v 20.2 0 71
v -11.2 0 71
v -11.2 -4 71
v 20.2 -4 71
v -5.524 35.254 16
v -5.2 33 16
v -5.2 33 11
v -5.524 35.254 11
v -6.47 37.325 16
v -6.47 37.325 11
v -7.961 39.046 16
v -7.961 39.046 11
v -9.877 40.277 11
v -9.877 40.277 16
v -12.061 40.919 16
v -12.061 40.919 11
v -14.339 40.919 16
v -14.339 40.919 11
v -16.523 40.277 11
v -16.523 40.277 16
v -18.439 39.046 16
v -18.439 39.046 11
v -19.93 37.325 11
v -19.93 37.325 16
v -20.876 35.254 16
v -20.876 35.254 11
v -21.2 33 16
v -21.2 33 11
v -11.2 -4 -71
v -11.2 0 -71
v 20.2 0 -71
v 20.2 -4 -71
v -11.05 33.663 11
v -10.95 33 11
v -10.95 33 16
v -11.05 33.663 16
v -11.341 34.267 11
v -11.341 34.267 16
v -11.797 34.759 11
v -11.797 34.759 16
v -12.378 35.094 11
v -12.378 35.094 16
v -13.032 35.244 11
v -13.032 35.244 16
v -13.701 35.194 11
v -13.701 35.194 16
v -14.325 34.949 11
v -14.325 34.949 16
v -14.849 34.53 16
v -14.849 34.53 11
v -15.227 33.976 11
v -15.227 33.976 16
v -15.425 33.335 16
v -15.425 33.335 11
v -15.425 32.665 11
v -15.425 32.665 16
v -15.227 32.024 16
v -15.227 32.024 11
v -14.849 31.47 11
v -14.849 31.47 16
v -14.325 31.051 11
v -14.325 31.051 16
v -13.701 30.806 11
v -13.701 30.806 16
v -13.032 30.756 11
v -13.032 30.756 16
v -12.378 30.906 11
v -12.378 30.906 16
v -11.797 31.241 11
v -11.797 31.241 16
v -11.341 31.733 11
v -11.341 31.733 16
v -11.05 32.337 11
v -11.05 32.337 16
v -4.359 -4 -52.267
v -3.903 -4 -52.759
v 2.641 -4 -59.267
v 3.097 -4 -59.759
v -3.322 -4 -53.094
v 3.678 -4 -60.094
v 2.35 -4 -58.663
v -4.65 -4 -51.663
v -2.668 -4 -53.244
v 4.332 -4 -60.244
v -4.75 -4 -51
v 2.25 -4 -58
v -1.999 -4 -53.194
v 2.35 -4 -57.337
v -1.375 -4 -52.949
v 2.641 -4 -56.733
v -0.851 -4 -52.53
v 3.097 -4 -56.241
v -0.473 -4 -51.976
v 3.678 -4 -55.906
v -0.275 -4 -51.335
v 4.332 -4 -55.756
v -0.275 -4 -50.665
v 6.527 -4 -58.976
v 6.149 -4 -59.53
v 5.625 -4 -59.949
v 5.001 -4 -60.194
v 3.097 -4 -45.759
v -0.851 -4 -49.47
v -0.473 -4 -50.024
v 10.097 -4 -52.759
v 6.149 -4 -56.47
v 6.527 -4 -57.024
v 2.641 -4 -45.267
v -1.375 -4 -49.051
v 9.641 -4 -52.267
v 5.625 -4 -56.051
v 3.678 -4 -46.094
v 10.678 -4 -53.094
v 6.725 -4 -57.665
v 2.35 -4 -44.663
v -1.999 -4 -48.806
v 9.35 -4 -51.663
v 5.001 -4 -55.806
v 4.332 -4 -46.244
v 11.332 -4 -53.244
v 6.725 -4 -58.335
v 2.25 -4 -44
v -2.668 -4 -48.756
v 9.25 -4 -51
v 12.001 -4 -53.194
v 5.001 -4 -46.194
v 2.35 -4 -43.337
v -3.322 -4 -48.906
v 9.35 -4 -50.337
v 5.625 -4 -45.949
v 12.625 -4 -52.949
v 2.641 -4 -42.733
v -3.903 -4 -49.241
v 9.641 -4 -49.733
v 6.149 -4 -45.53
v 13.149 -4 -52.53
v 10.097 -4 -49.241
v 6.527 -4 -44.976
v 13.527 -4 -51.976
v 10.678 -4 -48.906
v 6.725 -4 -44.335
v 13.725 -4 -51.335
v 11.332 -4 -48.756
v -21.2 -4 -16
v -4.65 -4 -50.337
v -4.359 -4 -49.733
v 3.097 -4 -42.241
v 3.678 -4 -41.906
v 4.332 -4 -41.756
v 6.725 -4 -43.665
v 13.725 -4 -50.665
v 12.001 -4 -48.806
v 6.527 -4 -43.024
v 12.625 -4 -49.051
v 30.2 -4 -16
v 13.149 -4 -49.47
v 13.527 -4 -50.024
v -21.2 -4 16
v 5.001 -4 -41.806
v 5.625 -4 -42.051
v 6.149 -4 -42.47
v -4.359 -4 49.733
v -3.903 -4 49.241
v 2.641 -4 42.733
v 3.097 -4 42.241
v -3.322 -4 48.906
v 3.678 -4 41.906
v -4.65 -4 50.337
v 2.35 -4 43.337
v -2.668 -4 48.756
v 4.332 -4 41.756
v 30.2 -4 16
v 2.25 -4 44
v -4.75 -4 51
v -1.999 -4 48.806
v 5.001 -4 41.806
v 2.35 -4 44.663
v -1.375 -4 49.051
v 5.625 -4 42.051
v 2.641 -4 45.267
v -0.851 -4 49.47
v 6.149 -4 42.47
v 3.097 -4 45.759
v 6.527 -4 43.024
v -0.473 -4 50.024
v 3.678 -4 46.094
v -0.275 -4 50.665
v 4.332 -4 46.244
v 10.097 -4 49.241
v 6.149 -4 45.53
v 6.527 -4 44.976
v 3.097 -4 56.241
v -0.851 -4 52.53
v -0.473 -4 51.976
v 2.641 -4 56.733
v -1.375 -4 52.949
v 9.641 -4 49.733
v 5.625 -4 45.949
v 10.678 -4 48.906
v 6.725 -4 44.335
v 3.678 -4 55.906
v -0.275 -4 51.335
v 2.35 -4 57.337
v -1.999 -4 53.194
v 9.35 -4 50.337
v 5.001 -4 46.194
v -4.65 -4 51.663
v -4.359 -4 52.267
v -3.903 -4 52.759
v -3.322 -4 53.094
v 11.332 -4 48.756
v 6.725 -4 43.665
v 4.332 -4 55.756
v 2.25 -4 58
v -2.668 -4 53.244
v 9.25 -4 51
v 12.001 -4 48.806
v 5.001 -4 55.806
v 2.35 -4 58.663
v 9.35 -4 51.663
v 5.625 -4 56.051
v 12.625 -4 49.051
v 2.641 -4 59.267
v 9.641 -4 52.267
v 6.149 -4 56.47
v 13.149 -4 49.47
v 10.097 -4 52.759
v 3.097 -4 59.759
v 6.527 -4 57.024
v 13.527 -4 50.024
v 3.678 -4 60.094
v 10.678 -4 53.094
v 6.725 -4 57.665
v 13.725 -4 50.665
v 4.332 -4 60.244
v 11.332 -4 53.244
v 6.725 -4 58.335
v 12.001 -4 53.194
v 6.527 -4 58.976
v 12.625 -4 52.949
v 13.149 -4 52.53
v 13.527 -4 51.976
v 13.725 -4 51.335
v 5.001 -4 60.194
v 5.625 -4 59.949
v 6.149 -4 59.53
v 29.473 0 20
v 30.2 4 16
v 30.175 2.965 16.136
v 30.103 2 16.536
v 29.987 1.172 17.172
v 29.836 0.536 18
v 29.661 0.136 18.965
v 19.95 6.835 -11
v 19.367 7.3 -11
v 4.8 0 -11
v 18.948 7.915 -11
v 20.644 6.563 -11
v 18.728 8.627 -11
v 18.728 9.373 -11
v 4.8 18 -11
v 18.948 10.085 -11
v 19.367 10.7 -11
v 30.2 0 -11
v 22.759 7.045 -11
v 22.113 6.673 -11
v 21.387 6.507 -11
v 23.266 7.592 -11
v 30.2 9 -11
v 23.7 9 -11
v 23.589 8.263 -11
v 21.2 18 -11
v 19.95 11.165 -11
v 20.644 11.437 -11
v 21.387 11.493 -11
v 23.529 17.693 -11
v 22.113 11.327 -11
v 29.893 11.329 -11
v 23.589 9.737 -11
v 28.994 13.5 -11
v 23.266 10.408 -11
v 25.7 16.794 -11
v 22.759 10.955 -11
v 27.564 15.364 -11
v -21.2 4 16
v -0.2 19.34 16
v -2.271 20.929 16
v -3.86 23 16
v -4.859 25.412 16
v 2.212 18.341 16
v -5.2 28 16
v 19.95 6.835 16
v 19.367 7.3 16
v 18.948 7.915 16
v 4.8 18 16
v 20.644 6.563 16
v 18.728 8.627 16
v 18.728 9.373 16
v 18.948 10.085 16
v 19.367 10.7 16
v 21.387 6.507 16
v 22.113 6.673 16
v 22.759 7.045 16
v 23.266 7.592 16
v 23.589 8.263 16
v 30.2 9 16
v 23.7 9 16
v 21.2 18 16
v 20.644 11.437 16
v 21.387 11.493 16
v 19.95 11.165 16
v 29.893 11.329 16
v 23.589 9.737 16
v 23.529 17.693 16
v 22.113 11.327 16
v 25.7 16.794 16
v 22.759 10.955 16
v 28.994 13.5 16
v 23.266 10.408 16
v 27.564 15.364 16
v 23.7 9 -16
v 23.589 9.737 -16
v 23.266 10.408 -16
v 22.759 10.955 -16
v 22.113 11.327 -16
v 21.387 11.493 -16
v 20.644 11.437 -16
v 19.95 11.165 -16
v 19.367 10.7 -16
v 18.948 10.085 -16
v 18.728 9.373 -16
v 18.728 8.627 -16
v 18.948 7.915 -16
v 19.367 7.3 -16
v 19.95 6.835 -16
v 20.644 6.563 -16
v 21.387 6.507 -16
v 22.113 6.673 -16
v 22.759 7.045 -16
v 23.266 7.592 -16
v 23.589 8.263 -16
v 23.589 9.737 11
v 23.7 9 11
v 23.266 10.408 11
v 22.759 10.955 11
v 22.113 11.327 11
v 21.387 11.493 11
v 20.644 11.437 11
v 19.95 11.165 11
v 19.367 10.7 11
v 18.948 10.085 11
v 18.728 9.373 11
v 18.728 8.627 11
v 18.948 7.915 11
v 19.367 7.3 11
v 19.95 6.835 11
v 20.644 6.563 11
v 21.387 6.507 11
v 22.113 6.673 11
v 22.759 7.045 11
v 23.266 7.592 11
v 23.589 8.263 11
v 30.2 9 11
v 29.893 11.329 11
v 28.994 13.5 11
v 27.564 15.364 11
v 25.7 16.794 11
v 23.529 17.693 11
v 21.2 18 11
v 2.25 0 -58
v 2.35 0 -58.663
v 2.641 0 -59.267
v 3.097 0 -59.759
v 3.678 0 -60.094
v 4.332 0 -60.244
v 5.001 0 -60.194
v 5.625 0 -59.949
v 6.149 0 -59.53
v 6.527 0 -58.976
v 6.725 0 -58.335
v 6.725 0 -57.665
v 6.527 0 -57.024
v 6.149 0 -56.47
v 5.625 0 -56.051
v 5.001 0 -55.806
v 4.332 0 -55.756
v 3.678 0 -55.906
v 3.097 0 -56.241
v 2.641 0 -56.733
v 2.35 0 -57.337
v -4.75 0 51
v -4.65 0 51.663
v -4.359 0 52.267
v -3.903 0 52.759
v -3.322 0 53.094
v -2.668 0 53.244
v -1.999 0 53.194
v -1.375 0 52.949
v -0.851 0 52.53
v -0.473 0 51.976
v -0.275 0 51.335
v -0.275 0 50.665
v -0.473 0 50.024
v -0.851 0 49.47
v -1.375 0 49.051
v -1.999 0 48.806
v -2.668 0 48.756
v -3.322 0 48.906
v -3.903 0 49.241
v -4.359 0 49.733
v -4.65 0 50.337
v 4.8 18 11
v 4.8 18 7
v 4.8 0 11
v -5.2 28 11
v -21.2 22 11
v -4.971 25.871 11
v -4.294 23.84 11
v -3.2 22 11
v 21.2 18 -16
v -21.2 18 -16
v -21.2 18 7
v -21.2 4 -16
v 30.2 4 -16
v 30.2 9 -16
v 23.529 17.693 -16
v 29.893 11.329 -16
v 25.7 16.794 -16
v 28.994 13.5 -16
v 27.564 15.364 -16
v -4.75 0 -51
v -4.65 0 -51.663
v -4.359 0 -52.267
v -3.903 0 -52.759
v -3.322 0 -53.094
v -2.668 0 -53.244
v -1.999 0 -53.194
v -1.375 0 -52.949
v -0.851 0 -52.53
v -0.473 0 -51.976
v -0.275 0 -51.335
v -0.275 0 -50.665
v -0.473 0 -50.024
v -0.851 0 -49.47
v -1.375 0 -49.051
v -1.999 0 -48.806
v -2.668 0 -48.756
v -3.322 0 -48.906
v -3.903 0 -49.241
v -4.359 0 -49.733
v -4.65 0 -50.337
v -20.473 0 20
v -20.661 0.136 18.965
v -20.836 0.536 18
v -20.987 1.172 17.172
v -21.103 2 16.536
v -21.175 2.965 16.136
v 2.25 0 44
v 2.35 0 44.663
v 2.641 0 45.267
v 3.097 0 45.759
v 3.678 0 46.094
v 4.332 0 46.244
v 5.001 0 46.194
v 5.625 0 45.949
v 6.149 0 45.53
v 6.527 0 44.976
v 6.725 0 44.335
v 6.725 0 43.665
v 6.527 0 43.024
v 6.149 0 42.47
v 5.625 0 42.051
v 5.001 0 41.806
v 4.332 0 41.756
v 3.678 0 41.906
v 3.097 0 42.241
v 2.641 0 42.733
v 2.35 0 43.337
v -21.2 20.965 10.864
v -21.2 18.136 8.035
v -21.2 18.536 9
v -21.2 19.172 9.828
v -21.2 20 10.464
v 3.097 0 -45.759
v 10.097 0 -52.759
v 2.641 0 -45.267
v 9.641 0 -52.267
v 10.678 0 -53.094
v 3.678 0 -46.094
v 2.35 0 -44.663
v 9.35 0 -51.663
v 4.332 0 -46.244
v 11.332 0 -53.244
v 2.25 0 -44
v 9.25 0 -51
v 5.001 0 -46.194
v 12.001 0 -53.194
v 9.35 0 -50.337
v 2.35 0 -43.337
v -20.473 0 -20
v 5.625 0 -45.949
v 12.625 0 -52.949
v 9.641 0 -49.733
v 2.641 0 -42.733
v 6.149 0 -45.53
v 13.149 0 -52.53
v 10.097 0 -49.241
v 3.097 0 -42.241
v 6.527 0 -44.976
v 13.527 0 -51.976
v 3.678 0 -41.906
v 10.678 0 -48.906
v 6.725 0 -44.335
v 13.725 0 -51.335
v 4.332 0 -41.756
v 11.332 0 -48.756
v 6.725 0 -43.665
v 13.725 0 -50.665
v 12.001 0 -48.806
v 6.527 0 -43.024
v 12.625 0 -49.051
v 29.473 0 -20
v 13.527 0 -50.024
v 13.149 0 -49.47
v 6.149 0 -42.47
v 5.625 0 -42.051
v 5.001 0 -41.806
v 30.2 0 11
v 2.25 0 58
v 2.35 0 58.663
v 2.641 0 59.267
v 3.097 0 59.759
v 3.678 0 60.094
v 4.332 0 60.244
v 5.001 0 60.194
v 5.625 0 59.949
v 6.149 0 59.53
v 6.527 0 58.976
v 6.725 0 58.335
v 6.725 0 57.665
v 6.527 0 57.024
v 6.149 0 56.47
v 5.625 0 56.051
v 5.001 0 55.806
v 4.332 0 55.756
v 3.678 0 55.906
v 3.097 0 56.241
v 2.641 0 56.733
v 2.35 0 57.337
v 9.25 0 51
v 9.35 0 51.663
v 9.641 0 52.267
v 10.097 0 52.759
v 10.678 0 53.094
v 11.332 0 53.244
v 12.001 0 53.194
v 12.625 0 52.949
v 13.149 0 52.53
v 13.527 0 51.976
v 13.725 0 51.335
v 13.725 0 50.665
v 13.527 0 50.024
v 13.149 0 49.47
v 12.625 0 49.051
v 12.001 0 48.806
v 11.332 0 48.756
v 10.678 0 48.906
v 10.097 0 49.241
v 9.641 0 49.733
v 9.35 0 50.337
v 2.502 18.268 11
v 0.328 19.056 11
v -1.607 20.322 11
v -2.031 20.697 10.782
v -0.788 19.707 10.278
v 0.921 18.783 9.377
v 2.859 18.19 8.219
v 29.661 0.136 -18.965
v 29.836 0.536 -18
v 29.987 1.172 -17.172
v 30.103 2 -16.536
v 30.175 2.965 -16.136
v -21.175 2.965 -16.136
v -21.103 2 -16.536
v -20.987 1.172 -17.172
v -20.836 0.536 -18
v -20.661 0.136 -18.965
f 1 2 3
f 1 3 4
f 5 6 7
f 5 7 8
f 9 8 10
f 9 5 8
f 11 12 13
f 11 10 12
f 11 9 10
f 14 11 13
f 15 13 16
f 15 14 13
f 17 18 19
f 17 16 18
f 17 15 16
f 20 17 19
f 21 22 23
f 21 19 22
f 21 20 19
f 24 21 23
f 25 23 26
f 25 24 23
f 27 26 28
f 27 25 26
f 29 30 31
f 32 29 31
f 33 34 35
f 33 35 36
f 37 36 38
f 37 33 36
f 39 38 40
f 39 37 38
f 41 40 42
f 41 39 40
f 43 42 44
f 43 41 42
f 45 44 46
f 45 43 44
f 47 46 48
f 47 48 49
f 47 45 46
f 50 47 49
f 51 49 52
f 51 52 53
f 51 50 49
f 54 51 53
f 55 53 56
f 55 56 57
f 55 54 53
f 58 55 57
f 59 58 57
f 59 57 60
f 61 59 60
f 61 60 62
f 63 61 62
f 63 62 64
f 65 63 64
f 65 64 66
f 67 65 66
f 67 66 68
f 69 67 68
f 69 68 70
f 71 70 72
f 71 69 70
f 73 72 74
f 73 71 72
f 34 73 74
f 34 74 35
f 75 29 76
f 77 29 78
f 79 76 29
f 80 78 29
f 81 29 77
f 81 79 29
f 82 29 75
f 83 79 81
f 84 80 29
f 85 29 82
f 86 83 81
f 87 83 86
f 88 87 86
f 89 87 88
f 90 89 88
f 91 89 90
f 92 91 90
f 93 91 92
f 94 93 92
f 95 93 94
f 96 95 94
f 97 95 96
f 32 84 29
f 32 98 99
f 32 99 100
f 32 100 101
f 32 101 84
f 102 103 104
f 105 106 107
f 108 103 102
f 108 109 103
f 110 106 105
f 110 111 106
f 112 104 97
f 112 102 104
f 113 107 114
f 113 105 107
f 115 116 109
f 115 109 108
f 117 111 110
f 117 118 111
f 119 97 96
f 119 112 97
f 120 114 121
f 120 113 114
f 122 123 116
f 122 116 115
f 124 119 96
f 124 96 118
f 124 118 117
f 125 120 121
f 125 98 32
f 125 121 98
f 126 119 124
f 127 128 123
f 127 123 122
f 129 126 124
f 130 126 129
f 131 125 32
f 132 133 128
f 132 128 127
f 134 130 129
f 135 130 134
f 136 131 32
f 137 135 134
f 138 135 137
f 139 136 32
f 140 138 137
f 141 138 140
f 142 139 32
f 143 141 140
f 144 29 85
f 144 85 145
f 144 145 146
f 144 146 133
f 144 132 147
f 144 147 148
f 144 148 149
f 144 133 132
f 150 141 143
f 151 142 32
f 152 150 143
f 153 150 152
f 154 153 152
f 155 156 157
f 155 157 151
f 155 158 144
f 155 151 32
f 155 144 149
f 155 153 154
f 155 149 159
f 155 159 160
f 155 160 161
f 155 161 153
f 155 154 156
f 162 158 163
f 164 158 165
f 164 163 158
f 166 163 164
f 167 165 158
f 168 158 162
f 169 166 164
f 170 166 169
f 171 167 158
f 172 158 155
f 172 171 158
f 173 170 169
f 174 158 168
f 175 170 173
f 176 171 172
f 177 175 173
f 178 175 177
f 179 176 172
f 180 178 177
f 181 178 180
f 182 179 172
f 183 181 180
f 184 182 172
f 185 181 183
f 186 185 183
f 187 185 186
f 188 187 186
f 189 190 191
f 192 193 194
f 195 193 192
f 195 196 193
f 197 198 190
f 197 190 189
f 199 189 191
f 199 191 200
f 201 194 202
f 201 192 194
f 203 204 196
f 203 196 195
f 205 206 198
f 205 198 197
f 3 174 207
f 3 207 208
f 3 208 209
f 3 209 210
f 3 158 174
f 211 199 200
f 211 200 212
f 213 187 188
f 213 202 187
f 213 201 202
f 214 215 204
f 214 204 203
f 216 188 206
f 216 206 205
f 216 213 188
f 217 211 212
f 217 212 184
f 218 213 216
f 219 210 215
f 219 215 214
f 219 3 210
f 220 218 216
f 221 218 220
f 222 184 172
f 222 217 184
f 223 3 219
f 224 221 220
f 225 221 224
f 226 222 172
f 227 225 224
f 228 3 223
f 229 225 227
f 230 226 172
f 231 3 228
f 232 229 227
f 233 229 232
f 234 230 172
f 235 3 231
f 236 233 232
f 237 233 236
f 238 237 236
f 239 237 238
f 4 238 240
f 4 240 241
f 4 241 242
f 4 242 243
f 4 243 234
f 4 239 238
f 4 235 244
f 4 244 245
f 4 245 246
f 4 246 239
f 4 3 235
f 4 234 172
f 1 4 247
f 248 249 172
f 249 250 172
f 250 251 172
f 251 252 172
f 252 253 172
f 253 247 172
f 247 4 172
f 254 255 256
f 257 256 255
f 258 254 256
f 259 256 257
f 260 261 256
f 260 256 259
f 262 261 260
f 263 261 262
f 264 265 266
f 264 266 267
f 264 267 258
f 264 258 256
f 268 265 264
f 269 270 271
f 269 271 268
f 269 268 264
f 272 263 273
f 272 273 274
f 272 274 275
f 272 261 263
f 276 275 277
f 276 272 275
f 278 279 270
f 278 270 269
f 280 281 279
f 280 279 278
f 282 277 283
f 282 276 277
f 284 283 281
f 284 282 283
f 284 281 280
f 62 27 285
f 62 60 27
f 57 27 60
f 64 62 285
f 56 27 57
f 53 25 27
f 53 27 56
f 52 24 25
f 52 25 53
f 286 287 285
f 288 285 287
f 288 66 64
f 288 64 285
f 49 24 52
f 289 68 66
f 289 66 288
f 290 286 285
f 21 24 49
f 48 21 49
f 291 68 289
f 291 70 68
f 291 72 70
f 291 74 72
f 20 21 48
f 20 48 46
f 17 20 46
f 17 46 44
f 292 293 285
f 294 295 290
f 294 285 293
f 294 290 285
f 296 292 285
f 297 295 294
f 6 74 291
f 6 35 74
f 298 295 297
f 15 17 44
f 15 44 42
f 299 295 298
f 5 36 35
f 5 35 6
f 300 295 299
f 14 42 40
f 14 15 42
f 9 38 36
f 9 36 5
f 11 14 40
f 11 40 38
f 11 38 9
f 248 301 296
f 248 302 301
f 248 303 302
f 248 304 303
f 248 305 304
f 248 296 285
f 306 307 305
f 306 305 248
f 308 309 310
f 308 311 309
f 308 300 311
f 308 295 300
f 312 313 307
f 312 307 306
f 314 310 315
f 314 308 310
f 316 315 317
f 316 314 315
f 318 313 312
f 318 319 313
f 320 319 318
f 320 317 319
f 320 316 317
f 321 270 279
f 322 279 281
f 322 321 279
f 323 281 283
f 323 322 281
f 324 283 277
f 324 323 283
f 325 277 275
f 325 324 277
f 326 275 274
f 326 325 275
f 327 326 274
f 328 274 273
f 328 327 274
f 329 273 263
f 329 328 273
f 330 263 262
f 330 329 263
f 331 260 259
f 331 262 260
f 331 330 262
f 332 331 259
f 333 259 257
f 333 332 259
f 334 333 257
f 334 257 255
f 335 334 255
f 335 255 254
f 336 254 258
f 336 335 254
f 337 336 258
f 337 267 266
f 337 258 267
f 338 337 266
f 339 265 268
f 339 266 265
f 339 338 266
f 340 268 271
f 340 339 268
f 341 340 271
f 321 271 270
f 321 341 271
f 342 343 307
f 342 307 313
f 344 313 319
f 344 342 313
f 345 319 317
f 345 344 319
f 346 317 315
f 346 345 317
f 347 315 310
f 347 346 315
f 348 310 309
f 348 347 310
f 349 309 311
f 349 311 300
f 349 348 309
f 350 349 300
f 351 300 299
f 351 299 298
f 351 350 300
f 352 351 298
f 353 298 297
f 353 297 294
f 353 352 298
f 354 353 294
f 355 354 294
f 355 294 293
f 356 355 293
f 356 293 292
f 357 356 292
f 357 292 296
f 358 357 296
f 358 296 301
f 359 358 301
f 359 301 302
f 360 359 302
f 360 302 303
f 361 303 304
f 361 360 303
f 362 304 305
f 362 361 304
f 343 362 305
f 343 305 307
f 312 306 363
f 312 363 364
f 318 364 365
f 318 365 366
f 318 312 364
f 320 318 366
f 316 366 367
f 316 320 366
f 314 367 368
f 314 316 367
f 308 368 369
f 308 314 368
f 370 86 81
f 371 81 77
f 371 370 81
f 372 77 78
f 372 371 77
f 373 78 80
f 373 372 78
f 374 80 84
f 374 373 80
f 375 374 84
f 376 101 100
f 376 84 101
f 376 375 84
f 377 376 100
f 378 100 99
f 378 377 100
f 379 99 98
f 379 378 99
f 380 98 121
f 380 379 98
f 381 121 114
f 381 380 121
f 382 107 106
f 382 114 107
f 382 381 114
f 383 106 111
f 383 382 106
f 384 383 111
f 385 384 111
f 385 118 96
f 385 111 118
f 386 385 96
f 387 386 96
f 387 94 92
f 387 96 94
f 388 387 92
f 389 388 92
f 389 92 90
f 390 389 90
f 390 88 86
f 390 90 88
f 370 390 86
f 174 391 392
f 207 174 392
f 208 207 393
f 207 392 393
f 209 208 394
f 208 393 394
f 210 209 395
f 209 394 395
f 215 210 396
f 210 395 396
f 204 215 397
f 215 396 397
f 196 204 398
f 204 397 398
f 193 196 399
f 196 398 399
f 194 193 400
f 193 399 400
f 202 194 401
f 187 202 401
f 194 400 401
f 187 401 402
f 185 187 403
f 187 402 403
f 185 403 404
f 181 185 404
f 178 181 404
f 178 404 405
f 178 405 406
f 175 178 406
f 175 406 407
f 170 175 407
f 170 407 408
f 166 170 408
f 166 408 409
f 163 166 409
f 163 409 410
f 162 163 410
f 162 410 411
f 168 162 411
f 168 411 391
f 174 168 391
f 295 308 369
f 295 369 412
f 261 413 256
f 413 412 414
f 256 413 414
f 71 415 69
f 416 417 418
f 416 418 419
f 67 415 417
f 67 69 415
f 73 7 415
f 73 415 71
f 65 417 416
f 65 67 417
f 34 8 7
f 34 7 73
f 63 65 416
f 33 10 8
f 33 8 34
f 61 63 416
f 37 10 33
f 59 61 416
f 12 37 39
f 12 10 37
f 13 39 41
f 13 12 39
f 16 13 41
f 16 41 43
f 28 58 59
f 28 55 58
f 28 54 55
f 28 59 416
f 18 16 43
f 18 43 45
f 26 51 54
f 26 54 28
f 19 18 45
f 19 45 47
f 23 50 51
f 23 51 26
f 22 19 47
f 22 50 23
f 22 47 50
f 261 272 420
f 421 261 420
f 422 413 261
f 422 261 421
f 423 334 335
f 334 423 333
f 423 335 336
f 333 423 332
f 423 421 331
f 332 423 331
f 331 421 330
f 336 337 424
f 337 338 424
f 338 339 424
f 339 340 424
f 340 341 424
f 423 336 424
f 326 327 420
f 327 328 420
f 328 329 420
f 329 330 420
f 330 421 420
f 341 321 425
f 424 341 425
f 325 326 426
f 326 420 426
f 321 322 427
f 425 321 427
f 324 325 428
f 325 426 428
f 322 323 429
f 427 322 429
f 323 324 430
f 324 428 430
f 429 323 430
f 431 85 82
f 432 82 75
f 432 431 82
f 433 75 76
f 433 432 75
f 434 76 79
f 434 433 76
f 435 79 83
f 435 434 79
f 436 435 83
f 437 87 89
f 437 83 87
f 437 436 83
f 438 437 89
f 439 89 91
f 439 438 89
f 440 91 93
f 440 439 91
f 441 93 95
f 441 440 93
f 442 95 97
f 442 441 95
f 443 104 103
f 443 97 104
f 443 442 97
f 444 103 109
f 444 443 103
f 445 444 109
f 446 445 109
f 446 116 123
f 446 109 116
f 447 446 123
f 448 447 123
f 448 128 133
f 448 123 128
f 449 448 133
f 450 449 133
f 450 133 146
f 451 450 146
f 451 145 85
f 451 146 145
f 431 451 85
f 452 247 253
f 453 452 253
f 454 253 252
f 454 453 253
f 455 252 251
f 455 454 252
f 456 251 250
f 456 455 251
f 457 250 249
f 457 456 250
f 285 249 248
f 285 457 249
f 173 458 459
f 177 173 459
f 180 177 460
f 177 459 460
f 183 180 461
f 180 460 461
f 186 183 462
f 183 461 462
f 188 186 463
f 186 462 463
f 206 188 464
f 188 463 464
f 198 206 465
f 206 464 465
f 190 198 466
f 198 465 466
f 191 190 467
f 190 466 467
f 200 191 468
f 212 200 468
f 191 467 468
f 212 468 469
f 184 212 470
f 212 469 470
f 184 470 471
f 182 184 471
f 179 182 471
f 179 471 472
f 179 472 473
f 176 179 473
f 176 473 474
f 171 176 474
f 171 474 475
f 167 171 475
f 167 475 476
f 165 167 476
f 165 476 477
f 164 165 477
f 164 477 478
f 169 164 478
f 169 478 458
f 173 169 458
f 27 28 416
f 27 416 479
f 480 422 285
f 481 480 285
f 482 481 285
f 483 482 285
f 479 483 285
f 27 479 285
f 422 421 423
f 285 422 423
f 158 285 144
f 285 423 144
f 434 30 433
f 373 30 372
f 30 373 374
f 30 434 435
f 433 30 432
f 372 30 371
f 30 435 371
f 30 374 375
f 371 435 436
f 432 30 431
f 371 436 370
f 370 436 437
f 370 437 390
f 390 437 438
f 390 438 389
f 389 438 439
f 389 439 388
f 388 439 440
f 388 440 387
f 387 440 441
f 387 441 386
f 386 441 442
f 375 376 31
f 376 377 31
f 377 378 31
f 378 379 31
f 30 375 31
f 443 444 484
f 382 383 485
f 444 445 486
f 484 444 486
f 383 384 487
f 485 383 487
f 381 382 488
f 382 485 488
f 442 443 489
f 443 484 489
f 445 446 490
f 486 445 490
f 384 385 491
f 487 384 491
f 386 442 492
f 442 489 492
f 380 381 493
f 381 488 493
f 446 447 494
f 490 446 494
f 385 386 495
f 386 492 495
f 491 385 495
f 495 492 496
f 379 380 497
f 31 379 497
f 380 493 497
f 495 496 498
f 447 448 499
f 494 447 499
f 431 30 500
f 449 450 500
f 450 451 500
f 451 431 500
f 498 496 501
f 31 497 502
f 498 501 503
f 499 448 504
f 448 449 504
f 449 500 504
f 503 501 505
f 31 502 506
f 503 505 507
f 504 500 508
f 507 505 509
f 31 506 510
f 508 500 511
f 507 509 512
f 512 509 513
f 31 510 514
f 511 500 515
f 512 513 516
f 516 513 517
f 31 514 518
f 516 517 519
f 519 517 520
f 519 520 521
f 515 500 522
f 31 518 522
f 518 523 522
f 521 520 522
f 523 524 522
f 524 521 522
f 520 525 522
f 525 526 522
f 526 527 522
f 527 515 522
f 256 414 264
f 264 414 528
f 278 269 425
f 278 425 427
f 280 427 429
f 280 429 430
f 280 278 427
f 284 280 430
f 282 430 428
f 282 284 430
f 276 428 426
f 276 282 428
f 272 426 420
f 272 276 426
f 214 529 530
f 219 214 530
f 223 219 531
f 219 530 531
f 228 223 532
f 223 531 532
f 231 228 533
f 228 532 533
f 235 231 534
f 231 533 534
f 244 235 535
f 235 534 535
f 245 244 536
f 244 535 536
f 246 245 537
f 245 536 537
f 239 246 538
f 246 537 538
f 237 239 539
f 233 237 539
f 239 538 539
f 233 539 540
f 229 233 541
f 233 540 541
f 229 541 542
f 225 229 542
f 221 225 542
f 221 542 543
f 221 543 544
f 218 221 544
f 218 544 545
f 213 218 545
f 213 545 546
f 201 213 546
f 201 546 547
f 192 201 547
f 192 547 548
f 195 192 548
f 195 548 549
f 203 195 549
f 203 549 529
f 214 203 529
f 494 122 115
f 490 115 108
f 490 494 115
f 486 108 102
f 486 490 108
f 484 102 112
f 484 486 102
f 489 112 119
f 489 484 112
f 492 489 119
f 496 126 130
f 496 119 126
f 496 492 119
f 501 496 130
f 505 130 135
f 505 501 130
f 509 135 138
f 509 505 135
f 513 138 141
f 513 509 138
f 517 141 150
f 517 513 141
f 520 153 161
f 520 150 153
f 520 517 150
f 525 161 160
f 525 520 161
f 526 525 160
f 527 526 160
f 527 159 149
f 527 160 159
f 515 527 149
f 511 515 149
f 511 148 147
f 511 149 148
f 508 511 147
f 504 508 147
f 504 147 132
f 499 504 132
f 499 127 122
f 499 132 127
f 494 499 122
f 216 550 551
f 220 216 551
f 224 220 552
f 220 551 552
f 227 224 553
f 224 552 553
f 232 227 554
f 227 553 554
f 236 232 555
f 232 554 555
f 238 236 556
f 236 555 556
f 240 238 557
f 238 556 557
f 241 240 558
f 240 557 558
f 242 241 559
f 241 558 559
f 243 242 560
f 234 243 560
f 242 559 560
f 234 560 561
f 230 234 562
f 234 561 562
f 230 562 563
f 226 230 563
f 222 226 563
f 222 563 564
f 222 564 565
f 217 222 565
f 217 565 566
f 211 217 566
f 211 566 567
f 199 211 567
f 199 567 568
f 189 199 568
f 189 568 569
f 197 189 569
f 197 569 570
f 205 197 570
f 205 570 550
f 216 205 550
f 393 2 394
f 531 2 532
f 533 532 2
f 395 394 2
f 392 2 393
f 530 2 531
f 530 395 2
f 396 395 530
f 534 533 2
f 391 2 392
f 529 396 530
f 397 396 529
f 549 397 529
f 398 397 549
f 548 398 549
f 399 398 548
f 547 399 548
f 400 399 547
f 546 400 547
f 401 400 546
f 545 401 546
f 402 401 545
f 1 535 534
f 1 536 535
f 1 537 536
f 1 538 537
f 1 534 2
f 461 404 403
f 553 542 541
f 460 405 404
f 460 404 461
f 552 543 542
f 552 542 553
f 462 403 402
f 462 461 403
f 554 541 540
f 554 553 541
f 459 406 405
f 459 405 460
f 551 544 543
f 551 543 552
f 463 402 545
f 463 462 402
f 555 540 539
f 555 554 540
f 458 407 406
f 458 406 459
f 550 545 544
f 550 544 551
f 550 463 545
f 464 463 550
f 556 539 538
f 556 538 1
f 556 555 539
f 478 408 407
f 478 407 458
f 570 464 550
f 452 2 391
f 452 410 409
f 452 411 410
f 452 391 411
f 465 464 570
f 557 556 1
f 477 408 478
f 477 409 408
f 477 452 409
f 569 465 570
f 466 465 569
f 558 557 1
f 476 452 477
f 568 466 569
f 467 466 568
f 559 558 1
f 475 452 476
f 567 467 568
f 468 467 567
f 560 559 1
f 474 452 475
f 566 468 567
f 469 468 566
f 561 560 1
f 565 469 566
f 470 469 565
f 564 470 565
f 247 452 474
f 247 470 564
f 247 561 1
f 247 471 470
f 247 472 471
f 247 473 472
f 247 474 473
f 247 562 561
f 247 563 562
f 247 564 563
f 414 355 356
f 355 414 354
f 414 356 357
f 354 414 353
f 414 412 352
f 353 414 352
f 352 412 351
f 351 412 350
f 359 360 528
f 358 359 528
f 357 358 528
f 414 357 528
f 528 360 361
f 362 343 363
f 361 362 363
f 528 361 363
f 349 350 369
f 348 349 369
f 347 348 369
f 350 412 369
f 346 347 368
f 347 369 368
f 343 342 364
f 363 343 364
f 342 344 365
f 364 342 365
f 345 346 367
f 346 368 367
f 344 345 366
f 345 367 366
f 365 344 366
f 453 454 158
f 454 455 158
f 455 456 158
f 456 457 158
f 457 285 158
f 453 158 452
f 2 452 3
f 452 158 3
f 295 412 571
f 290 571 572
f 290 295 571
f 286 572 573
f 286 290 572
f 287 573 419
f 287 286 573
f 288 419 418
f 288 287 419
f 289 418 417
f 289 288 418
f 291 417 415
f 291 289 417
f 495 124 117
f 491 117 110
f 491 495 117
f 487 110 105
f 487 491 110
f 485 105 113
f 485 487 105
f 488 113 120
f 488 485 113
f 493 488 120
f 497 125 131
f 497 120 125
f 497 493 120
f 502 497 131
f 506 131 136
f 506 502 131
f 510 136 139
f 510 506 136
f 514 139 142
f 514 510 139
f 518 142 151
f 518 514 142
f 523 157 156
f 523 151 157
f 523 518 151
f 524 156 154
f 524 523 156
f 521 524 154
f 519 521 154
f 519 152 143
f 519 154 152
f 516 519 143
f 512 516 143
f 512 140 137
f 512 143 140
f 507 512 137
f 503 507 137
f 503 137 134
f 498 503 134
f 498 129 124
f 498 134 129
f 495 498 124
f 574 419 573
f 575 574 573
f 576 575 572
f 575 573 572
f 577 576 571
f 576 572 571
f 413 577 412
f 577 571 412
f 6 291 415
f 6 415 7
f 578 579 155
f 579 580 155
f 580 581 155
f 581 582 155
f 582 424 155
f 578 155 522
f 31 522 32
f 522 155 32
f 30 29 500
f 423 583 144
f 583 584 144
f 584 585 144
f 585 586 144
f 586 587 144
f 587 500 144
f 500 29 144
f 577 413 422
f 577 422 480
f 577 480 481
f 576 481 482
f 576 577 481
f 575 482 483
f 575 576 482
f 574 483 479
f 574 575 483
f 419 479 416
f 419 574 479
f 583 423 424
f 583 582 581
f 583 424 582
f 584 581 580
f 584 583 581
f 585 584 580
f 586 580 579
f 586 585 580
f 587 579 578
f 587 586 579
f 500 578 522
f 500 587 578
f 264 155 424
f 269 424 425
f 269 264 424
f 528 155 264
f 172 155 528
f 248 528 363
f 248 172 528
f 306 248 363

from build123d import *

# Parameters (mm, degrees)
SKETCH1_R           = 2.5
SKETCH1_R_2         = 2.25
BOSS_EXTRUDE1_DEPTH = 16
SKETCH_2_W          = 51.4
SKETCH_2_H          = 4
EXTRUDE_1_DEPTH     = 55
SKETCH_3_R          = 2.25
CUT_EXTRUDE_2_DEPTH = 55
CUT_EXTRUDE_3_DEPTH = 11
CUT_EXTRUDE_START   = -27
CUT_EXTRUDE_4_DEPTH = 27
FILLET_1_R          = 4


with BuildPart() as part:
    # Sketch1 → Boss-Extrude1 (new, symmetric)
    with BuildSketch(Plane.XY):
        with BuildLine():
            Line((-21.2, 33), (-21.2, 22))
            Line((-21.2, 22), (-21.2, 0))
            Line((-21.2, 0), (-21.2, -4))
            Line((-21.2, -4), (30.2, -4))
            Line((30.2, -4), (30.2, 9))
            ThreePointArc((30.2, 9), (27.563961031, 15.363961031), (21.2, 18))
            Line((21.2, 18), (4.8, 18))
            ThreePointArc((4.8, 18), (-2.271067812, 20.928932188), (-5.2, 28))
            Line((-5.2, 28), (-5.2, 33))
            ThreePointArc((-5.2, 33), (-13.2, 41), (-21.2, 33))
        make_face()
        with Locations((21.2, 9)):
            Circle(SKETCH1_R, mode=Mode.SUBTRACT)
        with Locations((-13.2, 33)):
            Circle(SKETCH1_R_2, mode=Mode.SUBTRACT)
    extrude(amount=BOSS_EXTRUDE1_DEPTH, both=True)

    # 草图2 → 凸台-拉伸1 (add)
    with BuildSketch(Plane.XY.offset(16)):
        with Locations((4.5, -2)):
            Rectangle(SKETCH_2_W, SKETCH_2_H)
    extrude_1 = extrude(amount=EXTRUDE_1_DEPTH)

    # 草图3 → 切除-拉伸2 (cut)
    with BuildSketch(Plane(origin=(0, 0, 0), x_dir=(1, 0, 0), z_dir=(0, 1, 0))):
        with Locations(Location((11.5, -51, 0), (0, 0, 180))):
            Circle(SKETCH_3_R)
        with Locations(Location((4.5, -44, 0), (0, 0, 180))):
            Circle(SKETCH_3_R)
        with Locations(Location((4.5, -58, 0), (0, 0, 180))):
            Circle(SKETCH_3_R)
        with Locations(Location((-2.5, -51, 0), (0, 0, 180))):
            Circle(SKETCH_3_R)
        Polygon((30.2, -16), (20.2, -71), (30.2, -71), align=None)
        Polygon((-21.2, -16), (-11.2, -71), (-21.2, -71), align=None)
    cut_extrude_2 = extrude(amount=-CUT_EXTRUDE_2_DEPTH, mode=Mode.SUBTRACT)

    # 镜向1: 凸台-拉伸1, 切除-拉伸2 across plane
    add(extrude_1.mirror(Plane.XY))
    add(cut_extrude_2.mirror(Plane.XY), mode=Mode.SUBTRACT)

    # 草图6 → 切除-拉伸3 (cut, symmetric)
    with BuildSketch(Plane.XY):
        with BuildLine():
            Line((4.8, 18), (4.8, 0))
            Line((4.8, 0), (30.2, 0))
            Line((30.2, 0), (30.2, 9))
            ThreePointArc((30.2, 9), (27.563961031, 15.363961031), (21.2, 18))
            Line((21.2, 18), (4.8, 18))
        make_face()
    extrude(amount=CUT_EXTRUDE_3_DEPTH, both=True, mode=Mode.SUBTRACT)

    # 草图7 → 切除-拉伸4 (cut)
    with BuildSketch(Plane(origin=(0, 0, -16), x_dir=(-1, 0, 0), z_dir=(0, 0, -1)).offset(CUT_EXTRUDE_START)):
        with BuildLine():
            Line((-4.8, 18), (21.2, 18))
            Line((21.2, 18), (21.2, 33))
            ThreePointArc((21.2, 33), (13.2, 41), (5.2, 33))
            Line((5.2, 33), (5.2, 28))
            ThreePointArc((5.2, 28), (2.271067812, 20.928932188), (-4.8, 18))
        make_face()
    extrude(amount=CUT_EXTRUDE_4_DEPTH, mode=Mode.SUBTRACT)

    # 圆角1
    # the kernel refuses this fillet: 4 mm, written as the material it adds along each edge
    with BuildSketch(Plane(origin=(-31.2, 0, -16), x_dir=(0, 1, 0), z_dir=(1, 0, 0))) as fillet_1_piece_1_section:
        with BuildLine():
            CenterArc((FILLET_1_R, -FILLET_1_R), FILLET_1_R, 90, 90)
            Line((0, -FILLET_1_R), (0, 0))
            Line((0, 0), (FILLET_1_R, 0))
        make_face()
    fillet_1_piece_1 = extrude(amount=71.4, mode=Mode.PRIVATE)
    fillet_1_piece_1 = split(fillet_1_piece_1, bisect_by=Plane(origin=(-20.221053864, 0.89582788, -21.384203748), z_dir=(0.9838699100999075, 0, 0.178885438199983)), keep=Keep.TOP, mode=Mode.PRIVATE)
    fillet_1_piece_1 = split(fillet_1_piece_1, bisect_by=Plane(origin=(29.221053864, 0.89582788, -21.384203748), z_dir=(-0.9838699100999075, 0, 0.1788854381999831)), keep=Keep.TOP, mode=Mode.PRIVATE)
    add(fillet_1_piece_1)
    with BuildSketch(Plane(origin=(4.8, 18, 11), x_dir=(0, 1, 0), z_dir=(-1, 0, 0))) as fillet_1_piece_2_section:
        with BuildLine():
            CenterArc((FILLET_1_R, FILLET_1_R), FILLET_1_R, 180, 90)
            Line((0, FILLET_1_R), (0, 0))
            Line((0, 0), (FILLET_1_R, 0))
        make_face()
    fillet_1_piece_2 = extrude(amount=26, mode=Mode.PRIVATE)
    fillet_1_piece_2 = fillet_1_piece_2 - Plane(origin=(4.8, 28, 10.070813785), x_dir=(0, -1, 0), z_dir=(0, 0, 1)) * Cylinder(10, 68, mode=Mode.PRIVATE)
    add(fillet_1_piece_2)
    with BuildSketch(Plane(origin=(-31.2, 0, 16), x_dir=(0, 0, 1), z_dir=(1, 0, 0))) as fillet_1_piece_3_section:
        with BuildLine():
            CenterArc((FILLET_1_R, -FILLET_1_R), FILLET_1_R, 90, 90)
            Line((0, -FILLET_1_R), (0, 0))
            Line((0, 0), (FILLET_1_R, 0))
        make_face()
    fillet_1_piece_3 = extrude(amount=71.4, mode=Mode.PRIVATE)
    fillet_1_piece_3 = split(fillet_1_piece_3, bisect_by=Plane(origin=(29.221053864, 0.89582788, 21.384203748), z_dir=(-0.9838699100999075, 0, -0.1788854381999831)), keep=Keep.TOP, mode=Mode.PRIVATE)
    fillet_1_piece_3 = split(fillet_1_piece_3, bisect_by=Plane(origin=(-20.221053864, 0.89582788, 21.384203748), z_dir=(0.9838699100999075, 0, -0.178885438199983)), keep=Keep.TOP, mode=Mode.PRIVATE)
    add(fillet_1_piece_3)


solid = part.part
